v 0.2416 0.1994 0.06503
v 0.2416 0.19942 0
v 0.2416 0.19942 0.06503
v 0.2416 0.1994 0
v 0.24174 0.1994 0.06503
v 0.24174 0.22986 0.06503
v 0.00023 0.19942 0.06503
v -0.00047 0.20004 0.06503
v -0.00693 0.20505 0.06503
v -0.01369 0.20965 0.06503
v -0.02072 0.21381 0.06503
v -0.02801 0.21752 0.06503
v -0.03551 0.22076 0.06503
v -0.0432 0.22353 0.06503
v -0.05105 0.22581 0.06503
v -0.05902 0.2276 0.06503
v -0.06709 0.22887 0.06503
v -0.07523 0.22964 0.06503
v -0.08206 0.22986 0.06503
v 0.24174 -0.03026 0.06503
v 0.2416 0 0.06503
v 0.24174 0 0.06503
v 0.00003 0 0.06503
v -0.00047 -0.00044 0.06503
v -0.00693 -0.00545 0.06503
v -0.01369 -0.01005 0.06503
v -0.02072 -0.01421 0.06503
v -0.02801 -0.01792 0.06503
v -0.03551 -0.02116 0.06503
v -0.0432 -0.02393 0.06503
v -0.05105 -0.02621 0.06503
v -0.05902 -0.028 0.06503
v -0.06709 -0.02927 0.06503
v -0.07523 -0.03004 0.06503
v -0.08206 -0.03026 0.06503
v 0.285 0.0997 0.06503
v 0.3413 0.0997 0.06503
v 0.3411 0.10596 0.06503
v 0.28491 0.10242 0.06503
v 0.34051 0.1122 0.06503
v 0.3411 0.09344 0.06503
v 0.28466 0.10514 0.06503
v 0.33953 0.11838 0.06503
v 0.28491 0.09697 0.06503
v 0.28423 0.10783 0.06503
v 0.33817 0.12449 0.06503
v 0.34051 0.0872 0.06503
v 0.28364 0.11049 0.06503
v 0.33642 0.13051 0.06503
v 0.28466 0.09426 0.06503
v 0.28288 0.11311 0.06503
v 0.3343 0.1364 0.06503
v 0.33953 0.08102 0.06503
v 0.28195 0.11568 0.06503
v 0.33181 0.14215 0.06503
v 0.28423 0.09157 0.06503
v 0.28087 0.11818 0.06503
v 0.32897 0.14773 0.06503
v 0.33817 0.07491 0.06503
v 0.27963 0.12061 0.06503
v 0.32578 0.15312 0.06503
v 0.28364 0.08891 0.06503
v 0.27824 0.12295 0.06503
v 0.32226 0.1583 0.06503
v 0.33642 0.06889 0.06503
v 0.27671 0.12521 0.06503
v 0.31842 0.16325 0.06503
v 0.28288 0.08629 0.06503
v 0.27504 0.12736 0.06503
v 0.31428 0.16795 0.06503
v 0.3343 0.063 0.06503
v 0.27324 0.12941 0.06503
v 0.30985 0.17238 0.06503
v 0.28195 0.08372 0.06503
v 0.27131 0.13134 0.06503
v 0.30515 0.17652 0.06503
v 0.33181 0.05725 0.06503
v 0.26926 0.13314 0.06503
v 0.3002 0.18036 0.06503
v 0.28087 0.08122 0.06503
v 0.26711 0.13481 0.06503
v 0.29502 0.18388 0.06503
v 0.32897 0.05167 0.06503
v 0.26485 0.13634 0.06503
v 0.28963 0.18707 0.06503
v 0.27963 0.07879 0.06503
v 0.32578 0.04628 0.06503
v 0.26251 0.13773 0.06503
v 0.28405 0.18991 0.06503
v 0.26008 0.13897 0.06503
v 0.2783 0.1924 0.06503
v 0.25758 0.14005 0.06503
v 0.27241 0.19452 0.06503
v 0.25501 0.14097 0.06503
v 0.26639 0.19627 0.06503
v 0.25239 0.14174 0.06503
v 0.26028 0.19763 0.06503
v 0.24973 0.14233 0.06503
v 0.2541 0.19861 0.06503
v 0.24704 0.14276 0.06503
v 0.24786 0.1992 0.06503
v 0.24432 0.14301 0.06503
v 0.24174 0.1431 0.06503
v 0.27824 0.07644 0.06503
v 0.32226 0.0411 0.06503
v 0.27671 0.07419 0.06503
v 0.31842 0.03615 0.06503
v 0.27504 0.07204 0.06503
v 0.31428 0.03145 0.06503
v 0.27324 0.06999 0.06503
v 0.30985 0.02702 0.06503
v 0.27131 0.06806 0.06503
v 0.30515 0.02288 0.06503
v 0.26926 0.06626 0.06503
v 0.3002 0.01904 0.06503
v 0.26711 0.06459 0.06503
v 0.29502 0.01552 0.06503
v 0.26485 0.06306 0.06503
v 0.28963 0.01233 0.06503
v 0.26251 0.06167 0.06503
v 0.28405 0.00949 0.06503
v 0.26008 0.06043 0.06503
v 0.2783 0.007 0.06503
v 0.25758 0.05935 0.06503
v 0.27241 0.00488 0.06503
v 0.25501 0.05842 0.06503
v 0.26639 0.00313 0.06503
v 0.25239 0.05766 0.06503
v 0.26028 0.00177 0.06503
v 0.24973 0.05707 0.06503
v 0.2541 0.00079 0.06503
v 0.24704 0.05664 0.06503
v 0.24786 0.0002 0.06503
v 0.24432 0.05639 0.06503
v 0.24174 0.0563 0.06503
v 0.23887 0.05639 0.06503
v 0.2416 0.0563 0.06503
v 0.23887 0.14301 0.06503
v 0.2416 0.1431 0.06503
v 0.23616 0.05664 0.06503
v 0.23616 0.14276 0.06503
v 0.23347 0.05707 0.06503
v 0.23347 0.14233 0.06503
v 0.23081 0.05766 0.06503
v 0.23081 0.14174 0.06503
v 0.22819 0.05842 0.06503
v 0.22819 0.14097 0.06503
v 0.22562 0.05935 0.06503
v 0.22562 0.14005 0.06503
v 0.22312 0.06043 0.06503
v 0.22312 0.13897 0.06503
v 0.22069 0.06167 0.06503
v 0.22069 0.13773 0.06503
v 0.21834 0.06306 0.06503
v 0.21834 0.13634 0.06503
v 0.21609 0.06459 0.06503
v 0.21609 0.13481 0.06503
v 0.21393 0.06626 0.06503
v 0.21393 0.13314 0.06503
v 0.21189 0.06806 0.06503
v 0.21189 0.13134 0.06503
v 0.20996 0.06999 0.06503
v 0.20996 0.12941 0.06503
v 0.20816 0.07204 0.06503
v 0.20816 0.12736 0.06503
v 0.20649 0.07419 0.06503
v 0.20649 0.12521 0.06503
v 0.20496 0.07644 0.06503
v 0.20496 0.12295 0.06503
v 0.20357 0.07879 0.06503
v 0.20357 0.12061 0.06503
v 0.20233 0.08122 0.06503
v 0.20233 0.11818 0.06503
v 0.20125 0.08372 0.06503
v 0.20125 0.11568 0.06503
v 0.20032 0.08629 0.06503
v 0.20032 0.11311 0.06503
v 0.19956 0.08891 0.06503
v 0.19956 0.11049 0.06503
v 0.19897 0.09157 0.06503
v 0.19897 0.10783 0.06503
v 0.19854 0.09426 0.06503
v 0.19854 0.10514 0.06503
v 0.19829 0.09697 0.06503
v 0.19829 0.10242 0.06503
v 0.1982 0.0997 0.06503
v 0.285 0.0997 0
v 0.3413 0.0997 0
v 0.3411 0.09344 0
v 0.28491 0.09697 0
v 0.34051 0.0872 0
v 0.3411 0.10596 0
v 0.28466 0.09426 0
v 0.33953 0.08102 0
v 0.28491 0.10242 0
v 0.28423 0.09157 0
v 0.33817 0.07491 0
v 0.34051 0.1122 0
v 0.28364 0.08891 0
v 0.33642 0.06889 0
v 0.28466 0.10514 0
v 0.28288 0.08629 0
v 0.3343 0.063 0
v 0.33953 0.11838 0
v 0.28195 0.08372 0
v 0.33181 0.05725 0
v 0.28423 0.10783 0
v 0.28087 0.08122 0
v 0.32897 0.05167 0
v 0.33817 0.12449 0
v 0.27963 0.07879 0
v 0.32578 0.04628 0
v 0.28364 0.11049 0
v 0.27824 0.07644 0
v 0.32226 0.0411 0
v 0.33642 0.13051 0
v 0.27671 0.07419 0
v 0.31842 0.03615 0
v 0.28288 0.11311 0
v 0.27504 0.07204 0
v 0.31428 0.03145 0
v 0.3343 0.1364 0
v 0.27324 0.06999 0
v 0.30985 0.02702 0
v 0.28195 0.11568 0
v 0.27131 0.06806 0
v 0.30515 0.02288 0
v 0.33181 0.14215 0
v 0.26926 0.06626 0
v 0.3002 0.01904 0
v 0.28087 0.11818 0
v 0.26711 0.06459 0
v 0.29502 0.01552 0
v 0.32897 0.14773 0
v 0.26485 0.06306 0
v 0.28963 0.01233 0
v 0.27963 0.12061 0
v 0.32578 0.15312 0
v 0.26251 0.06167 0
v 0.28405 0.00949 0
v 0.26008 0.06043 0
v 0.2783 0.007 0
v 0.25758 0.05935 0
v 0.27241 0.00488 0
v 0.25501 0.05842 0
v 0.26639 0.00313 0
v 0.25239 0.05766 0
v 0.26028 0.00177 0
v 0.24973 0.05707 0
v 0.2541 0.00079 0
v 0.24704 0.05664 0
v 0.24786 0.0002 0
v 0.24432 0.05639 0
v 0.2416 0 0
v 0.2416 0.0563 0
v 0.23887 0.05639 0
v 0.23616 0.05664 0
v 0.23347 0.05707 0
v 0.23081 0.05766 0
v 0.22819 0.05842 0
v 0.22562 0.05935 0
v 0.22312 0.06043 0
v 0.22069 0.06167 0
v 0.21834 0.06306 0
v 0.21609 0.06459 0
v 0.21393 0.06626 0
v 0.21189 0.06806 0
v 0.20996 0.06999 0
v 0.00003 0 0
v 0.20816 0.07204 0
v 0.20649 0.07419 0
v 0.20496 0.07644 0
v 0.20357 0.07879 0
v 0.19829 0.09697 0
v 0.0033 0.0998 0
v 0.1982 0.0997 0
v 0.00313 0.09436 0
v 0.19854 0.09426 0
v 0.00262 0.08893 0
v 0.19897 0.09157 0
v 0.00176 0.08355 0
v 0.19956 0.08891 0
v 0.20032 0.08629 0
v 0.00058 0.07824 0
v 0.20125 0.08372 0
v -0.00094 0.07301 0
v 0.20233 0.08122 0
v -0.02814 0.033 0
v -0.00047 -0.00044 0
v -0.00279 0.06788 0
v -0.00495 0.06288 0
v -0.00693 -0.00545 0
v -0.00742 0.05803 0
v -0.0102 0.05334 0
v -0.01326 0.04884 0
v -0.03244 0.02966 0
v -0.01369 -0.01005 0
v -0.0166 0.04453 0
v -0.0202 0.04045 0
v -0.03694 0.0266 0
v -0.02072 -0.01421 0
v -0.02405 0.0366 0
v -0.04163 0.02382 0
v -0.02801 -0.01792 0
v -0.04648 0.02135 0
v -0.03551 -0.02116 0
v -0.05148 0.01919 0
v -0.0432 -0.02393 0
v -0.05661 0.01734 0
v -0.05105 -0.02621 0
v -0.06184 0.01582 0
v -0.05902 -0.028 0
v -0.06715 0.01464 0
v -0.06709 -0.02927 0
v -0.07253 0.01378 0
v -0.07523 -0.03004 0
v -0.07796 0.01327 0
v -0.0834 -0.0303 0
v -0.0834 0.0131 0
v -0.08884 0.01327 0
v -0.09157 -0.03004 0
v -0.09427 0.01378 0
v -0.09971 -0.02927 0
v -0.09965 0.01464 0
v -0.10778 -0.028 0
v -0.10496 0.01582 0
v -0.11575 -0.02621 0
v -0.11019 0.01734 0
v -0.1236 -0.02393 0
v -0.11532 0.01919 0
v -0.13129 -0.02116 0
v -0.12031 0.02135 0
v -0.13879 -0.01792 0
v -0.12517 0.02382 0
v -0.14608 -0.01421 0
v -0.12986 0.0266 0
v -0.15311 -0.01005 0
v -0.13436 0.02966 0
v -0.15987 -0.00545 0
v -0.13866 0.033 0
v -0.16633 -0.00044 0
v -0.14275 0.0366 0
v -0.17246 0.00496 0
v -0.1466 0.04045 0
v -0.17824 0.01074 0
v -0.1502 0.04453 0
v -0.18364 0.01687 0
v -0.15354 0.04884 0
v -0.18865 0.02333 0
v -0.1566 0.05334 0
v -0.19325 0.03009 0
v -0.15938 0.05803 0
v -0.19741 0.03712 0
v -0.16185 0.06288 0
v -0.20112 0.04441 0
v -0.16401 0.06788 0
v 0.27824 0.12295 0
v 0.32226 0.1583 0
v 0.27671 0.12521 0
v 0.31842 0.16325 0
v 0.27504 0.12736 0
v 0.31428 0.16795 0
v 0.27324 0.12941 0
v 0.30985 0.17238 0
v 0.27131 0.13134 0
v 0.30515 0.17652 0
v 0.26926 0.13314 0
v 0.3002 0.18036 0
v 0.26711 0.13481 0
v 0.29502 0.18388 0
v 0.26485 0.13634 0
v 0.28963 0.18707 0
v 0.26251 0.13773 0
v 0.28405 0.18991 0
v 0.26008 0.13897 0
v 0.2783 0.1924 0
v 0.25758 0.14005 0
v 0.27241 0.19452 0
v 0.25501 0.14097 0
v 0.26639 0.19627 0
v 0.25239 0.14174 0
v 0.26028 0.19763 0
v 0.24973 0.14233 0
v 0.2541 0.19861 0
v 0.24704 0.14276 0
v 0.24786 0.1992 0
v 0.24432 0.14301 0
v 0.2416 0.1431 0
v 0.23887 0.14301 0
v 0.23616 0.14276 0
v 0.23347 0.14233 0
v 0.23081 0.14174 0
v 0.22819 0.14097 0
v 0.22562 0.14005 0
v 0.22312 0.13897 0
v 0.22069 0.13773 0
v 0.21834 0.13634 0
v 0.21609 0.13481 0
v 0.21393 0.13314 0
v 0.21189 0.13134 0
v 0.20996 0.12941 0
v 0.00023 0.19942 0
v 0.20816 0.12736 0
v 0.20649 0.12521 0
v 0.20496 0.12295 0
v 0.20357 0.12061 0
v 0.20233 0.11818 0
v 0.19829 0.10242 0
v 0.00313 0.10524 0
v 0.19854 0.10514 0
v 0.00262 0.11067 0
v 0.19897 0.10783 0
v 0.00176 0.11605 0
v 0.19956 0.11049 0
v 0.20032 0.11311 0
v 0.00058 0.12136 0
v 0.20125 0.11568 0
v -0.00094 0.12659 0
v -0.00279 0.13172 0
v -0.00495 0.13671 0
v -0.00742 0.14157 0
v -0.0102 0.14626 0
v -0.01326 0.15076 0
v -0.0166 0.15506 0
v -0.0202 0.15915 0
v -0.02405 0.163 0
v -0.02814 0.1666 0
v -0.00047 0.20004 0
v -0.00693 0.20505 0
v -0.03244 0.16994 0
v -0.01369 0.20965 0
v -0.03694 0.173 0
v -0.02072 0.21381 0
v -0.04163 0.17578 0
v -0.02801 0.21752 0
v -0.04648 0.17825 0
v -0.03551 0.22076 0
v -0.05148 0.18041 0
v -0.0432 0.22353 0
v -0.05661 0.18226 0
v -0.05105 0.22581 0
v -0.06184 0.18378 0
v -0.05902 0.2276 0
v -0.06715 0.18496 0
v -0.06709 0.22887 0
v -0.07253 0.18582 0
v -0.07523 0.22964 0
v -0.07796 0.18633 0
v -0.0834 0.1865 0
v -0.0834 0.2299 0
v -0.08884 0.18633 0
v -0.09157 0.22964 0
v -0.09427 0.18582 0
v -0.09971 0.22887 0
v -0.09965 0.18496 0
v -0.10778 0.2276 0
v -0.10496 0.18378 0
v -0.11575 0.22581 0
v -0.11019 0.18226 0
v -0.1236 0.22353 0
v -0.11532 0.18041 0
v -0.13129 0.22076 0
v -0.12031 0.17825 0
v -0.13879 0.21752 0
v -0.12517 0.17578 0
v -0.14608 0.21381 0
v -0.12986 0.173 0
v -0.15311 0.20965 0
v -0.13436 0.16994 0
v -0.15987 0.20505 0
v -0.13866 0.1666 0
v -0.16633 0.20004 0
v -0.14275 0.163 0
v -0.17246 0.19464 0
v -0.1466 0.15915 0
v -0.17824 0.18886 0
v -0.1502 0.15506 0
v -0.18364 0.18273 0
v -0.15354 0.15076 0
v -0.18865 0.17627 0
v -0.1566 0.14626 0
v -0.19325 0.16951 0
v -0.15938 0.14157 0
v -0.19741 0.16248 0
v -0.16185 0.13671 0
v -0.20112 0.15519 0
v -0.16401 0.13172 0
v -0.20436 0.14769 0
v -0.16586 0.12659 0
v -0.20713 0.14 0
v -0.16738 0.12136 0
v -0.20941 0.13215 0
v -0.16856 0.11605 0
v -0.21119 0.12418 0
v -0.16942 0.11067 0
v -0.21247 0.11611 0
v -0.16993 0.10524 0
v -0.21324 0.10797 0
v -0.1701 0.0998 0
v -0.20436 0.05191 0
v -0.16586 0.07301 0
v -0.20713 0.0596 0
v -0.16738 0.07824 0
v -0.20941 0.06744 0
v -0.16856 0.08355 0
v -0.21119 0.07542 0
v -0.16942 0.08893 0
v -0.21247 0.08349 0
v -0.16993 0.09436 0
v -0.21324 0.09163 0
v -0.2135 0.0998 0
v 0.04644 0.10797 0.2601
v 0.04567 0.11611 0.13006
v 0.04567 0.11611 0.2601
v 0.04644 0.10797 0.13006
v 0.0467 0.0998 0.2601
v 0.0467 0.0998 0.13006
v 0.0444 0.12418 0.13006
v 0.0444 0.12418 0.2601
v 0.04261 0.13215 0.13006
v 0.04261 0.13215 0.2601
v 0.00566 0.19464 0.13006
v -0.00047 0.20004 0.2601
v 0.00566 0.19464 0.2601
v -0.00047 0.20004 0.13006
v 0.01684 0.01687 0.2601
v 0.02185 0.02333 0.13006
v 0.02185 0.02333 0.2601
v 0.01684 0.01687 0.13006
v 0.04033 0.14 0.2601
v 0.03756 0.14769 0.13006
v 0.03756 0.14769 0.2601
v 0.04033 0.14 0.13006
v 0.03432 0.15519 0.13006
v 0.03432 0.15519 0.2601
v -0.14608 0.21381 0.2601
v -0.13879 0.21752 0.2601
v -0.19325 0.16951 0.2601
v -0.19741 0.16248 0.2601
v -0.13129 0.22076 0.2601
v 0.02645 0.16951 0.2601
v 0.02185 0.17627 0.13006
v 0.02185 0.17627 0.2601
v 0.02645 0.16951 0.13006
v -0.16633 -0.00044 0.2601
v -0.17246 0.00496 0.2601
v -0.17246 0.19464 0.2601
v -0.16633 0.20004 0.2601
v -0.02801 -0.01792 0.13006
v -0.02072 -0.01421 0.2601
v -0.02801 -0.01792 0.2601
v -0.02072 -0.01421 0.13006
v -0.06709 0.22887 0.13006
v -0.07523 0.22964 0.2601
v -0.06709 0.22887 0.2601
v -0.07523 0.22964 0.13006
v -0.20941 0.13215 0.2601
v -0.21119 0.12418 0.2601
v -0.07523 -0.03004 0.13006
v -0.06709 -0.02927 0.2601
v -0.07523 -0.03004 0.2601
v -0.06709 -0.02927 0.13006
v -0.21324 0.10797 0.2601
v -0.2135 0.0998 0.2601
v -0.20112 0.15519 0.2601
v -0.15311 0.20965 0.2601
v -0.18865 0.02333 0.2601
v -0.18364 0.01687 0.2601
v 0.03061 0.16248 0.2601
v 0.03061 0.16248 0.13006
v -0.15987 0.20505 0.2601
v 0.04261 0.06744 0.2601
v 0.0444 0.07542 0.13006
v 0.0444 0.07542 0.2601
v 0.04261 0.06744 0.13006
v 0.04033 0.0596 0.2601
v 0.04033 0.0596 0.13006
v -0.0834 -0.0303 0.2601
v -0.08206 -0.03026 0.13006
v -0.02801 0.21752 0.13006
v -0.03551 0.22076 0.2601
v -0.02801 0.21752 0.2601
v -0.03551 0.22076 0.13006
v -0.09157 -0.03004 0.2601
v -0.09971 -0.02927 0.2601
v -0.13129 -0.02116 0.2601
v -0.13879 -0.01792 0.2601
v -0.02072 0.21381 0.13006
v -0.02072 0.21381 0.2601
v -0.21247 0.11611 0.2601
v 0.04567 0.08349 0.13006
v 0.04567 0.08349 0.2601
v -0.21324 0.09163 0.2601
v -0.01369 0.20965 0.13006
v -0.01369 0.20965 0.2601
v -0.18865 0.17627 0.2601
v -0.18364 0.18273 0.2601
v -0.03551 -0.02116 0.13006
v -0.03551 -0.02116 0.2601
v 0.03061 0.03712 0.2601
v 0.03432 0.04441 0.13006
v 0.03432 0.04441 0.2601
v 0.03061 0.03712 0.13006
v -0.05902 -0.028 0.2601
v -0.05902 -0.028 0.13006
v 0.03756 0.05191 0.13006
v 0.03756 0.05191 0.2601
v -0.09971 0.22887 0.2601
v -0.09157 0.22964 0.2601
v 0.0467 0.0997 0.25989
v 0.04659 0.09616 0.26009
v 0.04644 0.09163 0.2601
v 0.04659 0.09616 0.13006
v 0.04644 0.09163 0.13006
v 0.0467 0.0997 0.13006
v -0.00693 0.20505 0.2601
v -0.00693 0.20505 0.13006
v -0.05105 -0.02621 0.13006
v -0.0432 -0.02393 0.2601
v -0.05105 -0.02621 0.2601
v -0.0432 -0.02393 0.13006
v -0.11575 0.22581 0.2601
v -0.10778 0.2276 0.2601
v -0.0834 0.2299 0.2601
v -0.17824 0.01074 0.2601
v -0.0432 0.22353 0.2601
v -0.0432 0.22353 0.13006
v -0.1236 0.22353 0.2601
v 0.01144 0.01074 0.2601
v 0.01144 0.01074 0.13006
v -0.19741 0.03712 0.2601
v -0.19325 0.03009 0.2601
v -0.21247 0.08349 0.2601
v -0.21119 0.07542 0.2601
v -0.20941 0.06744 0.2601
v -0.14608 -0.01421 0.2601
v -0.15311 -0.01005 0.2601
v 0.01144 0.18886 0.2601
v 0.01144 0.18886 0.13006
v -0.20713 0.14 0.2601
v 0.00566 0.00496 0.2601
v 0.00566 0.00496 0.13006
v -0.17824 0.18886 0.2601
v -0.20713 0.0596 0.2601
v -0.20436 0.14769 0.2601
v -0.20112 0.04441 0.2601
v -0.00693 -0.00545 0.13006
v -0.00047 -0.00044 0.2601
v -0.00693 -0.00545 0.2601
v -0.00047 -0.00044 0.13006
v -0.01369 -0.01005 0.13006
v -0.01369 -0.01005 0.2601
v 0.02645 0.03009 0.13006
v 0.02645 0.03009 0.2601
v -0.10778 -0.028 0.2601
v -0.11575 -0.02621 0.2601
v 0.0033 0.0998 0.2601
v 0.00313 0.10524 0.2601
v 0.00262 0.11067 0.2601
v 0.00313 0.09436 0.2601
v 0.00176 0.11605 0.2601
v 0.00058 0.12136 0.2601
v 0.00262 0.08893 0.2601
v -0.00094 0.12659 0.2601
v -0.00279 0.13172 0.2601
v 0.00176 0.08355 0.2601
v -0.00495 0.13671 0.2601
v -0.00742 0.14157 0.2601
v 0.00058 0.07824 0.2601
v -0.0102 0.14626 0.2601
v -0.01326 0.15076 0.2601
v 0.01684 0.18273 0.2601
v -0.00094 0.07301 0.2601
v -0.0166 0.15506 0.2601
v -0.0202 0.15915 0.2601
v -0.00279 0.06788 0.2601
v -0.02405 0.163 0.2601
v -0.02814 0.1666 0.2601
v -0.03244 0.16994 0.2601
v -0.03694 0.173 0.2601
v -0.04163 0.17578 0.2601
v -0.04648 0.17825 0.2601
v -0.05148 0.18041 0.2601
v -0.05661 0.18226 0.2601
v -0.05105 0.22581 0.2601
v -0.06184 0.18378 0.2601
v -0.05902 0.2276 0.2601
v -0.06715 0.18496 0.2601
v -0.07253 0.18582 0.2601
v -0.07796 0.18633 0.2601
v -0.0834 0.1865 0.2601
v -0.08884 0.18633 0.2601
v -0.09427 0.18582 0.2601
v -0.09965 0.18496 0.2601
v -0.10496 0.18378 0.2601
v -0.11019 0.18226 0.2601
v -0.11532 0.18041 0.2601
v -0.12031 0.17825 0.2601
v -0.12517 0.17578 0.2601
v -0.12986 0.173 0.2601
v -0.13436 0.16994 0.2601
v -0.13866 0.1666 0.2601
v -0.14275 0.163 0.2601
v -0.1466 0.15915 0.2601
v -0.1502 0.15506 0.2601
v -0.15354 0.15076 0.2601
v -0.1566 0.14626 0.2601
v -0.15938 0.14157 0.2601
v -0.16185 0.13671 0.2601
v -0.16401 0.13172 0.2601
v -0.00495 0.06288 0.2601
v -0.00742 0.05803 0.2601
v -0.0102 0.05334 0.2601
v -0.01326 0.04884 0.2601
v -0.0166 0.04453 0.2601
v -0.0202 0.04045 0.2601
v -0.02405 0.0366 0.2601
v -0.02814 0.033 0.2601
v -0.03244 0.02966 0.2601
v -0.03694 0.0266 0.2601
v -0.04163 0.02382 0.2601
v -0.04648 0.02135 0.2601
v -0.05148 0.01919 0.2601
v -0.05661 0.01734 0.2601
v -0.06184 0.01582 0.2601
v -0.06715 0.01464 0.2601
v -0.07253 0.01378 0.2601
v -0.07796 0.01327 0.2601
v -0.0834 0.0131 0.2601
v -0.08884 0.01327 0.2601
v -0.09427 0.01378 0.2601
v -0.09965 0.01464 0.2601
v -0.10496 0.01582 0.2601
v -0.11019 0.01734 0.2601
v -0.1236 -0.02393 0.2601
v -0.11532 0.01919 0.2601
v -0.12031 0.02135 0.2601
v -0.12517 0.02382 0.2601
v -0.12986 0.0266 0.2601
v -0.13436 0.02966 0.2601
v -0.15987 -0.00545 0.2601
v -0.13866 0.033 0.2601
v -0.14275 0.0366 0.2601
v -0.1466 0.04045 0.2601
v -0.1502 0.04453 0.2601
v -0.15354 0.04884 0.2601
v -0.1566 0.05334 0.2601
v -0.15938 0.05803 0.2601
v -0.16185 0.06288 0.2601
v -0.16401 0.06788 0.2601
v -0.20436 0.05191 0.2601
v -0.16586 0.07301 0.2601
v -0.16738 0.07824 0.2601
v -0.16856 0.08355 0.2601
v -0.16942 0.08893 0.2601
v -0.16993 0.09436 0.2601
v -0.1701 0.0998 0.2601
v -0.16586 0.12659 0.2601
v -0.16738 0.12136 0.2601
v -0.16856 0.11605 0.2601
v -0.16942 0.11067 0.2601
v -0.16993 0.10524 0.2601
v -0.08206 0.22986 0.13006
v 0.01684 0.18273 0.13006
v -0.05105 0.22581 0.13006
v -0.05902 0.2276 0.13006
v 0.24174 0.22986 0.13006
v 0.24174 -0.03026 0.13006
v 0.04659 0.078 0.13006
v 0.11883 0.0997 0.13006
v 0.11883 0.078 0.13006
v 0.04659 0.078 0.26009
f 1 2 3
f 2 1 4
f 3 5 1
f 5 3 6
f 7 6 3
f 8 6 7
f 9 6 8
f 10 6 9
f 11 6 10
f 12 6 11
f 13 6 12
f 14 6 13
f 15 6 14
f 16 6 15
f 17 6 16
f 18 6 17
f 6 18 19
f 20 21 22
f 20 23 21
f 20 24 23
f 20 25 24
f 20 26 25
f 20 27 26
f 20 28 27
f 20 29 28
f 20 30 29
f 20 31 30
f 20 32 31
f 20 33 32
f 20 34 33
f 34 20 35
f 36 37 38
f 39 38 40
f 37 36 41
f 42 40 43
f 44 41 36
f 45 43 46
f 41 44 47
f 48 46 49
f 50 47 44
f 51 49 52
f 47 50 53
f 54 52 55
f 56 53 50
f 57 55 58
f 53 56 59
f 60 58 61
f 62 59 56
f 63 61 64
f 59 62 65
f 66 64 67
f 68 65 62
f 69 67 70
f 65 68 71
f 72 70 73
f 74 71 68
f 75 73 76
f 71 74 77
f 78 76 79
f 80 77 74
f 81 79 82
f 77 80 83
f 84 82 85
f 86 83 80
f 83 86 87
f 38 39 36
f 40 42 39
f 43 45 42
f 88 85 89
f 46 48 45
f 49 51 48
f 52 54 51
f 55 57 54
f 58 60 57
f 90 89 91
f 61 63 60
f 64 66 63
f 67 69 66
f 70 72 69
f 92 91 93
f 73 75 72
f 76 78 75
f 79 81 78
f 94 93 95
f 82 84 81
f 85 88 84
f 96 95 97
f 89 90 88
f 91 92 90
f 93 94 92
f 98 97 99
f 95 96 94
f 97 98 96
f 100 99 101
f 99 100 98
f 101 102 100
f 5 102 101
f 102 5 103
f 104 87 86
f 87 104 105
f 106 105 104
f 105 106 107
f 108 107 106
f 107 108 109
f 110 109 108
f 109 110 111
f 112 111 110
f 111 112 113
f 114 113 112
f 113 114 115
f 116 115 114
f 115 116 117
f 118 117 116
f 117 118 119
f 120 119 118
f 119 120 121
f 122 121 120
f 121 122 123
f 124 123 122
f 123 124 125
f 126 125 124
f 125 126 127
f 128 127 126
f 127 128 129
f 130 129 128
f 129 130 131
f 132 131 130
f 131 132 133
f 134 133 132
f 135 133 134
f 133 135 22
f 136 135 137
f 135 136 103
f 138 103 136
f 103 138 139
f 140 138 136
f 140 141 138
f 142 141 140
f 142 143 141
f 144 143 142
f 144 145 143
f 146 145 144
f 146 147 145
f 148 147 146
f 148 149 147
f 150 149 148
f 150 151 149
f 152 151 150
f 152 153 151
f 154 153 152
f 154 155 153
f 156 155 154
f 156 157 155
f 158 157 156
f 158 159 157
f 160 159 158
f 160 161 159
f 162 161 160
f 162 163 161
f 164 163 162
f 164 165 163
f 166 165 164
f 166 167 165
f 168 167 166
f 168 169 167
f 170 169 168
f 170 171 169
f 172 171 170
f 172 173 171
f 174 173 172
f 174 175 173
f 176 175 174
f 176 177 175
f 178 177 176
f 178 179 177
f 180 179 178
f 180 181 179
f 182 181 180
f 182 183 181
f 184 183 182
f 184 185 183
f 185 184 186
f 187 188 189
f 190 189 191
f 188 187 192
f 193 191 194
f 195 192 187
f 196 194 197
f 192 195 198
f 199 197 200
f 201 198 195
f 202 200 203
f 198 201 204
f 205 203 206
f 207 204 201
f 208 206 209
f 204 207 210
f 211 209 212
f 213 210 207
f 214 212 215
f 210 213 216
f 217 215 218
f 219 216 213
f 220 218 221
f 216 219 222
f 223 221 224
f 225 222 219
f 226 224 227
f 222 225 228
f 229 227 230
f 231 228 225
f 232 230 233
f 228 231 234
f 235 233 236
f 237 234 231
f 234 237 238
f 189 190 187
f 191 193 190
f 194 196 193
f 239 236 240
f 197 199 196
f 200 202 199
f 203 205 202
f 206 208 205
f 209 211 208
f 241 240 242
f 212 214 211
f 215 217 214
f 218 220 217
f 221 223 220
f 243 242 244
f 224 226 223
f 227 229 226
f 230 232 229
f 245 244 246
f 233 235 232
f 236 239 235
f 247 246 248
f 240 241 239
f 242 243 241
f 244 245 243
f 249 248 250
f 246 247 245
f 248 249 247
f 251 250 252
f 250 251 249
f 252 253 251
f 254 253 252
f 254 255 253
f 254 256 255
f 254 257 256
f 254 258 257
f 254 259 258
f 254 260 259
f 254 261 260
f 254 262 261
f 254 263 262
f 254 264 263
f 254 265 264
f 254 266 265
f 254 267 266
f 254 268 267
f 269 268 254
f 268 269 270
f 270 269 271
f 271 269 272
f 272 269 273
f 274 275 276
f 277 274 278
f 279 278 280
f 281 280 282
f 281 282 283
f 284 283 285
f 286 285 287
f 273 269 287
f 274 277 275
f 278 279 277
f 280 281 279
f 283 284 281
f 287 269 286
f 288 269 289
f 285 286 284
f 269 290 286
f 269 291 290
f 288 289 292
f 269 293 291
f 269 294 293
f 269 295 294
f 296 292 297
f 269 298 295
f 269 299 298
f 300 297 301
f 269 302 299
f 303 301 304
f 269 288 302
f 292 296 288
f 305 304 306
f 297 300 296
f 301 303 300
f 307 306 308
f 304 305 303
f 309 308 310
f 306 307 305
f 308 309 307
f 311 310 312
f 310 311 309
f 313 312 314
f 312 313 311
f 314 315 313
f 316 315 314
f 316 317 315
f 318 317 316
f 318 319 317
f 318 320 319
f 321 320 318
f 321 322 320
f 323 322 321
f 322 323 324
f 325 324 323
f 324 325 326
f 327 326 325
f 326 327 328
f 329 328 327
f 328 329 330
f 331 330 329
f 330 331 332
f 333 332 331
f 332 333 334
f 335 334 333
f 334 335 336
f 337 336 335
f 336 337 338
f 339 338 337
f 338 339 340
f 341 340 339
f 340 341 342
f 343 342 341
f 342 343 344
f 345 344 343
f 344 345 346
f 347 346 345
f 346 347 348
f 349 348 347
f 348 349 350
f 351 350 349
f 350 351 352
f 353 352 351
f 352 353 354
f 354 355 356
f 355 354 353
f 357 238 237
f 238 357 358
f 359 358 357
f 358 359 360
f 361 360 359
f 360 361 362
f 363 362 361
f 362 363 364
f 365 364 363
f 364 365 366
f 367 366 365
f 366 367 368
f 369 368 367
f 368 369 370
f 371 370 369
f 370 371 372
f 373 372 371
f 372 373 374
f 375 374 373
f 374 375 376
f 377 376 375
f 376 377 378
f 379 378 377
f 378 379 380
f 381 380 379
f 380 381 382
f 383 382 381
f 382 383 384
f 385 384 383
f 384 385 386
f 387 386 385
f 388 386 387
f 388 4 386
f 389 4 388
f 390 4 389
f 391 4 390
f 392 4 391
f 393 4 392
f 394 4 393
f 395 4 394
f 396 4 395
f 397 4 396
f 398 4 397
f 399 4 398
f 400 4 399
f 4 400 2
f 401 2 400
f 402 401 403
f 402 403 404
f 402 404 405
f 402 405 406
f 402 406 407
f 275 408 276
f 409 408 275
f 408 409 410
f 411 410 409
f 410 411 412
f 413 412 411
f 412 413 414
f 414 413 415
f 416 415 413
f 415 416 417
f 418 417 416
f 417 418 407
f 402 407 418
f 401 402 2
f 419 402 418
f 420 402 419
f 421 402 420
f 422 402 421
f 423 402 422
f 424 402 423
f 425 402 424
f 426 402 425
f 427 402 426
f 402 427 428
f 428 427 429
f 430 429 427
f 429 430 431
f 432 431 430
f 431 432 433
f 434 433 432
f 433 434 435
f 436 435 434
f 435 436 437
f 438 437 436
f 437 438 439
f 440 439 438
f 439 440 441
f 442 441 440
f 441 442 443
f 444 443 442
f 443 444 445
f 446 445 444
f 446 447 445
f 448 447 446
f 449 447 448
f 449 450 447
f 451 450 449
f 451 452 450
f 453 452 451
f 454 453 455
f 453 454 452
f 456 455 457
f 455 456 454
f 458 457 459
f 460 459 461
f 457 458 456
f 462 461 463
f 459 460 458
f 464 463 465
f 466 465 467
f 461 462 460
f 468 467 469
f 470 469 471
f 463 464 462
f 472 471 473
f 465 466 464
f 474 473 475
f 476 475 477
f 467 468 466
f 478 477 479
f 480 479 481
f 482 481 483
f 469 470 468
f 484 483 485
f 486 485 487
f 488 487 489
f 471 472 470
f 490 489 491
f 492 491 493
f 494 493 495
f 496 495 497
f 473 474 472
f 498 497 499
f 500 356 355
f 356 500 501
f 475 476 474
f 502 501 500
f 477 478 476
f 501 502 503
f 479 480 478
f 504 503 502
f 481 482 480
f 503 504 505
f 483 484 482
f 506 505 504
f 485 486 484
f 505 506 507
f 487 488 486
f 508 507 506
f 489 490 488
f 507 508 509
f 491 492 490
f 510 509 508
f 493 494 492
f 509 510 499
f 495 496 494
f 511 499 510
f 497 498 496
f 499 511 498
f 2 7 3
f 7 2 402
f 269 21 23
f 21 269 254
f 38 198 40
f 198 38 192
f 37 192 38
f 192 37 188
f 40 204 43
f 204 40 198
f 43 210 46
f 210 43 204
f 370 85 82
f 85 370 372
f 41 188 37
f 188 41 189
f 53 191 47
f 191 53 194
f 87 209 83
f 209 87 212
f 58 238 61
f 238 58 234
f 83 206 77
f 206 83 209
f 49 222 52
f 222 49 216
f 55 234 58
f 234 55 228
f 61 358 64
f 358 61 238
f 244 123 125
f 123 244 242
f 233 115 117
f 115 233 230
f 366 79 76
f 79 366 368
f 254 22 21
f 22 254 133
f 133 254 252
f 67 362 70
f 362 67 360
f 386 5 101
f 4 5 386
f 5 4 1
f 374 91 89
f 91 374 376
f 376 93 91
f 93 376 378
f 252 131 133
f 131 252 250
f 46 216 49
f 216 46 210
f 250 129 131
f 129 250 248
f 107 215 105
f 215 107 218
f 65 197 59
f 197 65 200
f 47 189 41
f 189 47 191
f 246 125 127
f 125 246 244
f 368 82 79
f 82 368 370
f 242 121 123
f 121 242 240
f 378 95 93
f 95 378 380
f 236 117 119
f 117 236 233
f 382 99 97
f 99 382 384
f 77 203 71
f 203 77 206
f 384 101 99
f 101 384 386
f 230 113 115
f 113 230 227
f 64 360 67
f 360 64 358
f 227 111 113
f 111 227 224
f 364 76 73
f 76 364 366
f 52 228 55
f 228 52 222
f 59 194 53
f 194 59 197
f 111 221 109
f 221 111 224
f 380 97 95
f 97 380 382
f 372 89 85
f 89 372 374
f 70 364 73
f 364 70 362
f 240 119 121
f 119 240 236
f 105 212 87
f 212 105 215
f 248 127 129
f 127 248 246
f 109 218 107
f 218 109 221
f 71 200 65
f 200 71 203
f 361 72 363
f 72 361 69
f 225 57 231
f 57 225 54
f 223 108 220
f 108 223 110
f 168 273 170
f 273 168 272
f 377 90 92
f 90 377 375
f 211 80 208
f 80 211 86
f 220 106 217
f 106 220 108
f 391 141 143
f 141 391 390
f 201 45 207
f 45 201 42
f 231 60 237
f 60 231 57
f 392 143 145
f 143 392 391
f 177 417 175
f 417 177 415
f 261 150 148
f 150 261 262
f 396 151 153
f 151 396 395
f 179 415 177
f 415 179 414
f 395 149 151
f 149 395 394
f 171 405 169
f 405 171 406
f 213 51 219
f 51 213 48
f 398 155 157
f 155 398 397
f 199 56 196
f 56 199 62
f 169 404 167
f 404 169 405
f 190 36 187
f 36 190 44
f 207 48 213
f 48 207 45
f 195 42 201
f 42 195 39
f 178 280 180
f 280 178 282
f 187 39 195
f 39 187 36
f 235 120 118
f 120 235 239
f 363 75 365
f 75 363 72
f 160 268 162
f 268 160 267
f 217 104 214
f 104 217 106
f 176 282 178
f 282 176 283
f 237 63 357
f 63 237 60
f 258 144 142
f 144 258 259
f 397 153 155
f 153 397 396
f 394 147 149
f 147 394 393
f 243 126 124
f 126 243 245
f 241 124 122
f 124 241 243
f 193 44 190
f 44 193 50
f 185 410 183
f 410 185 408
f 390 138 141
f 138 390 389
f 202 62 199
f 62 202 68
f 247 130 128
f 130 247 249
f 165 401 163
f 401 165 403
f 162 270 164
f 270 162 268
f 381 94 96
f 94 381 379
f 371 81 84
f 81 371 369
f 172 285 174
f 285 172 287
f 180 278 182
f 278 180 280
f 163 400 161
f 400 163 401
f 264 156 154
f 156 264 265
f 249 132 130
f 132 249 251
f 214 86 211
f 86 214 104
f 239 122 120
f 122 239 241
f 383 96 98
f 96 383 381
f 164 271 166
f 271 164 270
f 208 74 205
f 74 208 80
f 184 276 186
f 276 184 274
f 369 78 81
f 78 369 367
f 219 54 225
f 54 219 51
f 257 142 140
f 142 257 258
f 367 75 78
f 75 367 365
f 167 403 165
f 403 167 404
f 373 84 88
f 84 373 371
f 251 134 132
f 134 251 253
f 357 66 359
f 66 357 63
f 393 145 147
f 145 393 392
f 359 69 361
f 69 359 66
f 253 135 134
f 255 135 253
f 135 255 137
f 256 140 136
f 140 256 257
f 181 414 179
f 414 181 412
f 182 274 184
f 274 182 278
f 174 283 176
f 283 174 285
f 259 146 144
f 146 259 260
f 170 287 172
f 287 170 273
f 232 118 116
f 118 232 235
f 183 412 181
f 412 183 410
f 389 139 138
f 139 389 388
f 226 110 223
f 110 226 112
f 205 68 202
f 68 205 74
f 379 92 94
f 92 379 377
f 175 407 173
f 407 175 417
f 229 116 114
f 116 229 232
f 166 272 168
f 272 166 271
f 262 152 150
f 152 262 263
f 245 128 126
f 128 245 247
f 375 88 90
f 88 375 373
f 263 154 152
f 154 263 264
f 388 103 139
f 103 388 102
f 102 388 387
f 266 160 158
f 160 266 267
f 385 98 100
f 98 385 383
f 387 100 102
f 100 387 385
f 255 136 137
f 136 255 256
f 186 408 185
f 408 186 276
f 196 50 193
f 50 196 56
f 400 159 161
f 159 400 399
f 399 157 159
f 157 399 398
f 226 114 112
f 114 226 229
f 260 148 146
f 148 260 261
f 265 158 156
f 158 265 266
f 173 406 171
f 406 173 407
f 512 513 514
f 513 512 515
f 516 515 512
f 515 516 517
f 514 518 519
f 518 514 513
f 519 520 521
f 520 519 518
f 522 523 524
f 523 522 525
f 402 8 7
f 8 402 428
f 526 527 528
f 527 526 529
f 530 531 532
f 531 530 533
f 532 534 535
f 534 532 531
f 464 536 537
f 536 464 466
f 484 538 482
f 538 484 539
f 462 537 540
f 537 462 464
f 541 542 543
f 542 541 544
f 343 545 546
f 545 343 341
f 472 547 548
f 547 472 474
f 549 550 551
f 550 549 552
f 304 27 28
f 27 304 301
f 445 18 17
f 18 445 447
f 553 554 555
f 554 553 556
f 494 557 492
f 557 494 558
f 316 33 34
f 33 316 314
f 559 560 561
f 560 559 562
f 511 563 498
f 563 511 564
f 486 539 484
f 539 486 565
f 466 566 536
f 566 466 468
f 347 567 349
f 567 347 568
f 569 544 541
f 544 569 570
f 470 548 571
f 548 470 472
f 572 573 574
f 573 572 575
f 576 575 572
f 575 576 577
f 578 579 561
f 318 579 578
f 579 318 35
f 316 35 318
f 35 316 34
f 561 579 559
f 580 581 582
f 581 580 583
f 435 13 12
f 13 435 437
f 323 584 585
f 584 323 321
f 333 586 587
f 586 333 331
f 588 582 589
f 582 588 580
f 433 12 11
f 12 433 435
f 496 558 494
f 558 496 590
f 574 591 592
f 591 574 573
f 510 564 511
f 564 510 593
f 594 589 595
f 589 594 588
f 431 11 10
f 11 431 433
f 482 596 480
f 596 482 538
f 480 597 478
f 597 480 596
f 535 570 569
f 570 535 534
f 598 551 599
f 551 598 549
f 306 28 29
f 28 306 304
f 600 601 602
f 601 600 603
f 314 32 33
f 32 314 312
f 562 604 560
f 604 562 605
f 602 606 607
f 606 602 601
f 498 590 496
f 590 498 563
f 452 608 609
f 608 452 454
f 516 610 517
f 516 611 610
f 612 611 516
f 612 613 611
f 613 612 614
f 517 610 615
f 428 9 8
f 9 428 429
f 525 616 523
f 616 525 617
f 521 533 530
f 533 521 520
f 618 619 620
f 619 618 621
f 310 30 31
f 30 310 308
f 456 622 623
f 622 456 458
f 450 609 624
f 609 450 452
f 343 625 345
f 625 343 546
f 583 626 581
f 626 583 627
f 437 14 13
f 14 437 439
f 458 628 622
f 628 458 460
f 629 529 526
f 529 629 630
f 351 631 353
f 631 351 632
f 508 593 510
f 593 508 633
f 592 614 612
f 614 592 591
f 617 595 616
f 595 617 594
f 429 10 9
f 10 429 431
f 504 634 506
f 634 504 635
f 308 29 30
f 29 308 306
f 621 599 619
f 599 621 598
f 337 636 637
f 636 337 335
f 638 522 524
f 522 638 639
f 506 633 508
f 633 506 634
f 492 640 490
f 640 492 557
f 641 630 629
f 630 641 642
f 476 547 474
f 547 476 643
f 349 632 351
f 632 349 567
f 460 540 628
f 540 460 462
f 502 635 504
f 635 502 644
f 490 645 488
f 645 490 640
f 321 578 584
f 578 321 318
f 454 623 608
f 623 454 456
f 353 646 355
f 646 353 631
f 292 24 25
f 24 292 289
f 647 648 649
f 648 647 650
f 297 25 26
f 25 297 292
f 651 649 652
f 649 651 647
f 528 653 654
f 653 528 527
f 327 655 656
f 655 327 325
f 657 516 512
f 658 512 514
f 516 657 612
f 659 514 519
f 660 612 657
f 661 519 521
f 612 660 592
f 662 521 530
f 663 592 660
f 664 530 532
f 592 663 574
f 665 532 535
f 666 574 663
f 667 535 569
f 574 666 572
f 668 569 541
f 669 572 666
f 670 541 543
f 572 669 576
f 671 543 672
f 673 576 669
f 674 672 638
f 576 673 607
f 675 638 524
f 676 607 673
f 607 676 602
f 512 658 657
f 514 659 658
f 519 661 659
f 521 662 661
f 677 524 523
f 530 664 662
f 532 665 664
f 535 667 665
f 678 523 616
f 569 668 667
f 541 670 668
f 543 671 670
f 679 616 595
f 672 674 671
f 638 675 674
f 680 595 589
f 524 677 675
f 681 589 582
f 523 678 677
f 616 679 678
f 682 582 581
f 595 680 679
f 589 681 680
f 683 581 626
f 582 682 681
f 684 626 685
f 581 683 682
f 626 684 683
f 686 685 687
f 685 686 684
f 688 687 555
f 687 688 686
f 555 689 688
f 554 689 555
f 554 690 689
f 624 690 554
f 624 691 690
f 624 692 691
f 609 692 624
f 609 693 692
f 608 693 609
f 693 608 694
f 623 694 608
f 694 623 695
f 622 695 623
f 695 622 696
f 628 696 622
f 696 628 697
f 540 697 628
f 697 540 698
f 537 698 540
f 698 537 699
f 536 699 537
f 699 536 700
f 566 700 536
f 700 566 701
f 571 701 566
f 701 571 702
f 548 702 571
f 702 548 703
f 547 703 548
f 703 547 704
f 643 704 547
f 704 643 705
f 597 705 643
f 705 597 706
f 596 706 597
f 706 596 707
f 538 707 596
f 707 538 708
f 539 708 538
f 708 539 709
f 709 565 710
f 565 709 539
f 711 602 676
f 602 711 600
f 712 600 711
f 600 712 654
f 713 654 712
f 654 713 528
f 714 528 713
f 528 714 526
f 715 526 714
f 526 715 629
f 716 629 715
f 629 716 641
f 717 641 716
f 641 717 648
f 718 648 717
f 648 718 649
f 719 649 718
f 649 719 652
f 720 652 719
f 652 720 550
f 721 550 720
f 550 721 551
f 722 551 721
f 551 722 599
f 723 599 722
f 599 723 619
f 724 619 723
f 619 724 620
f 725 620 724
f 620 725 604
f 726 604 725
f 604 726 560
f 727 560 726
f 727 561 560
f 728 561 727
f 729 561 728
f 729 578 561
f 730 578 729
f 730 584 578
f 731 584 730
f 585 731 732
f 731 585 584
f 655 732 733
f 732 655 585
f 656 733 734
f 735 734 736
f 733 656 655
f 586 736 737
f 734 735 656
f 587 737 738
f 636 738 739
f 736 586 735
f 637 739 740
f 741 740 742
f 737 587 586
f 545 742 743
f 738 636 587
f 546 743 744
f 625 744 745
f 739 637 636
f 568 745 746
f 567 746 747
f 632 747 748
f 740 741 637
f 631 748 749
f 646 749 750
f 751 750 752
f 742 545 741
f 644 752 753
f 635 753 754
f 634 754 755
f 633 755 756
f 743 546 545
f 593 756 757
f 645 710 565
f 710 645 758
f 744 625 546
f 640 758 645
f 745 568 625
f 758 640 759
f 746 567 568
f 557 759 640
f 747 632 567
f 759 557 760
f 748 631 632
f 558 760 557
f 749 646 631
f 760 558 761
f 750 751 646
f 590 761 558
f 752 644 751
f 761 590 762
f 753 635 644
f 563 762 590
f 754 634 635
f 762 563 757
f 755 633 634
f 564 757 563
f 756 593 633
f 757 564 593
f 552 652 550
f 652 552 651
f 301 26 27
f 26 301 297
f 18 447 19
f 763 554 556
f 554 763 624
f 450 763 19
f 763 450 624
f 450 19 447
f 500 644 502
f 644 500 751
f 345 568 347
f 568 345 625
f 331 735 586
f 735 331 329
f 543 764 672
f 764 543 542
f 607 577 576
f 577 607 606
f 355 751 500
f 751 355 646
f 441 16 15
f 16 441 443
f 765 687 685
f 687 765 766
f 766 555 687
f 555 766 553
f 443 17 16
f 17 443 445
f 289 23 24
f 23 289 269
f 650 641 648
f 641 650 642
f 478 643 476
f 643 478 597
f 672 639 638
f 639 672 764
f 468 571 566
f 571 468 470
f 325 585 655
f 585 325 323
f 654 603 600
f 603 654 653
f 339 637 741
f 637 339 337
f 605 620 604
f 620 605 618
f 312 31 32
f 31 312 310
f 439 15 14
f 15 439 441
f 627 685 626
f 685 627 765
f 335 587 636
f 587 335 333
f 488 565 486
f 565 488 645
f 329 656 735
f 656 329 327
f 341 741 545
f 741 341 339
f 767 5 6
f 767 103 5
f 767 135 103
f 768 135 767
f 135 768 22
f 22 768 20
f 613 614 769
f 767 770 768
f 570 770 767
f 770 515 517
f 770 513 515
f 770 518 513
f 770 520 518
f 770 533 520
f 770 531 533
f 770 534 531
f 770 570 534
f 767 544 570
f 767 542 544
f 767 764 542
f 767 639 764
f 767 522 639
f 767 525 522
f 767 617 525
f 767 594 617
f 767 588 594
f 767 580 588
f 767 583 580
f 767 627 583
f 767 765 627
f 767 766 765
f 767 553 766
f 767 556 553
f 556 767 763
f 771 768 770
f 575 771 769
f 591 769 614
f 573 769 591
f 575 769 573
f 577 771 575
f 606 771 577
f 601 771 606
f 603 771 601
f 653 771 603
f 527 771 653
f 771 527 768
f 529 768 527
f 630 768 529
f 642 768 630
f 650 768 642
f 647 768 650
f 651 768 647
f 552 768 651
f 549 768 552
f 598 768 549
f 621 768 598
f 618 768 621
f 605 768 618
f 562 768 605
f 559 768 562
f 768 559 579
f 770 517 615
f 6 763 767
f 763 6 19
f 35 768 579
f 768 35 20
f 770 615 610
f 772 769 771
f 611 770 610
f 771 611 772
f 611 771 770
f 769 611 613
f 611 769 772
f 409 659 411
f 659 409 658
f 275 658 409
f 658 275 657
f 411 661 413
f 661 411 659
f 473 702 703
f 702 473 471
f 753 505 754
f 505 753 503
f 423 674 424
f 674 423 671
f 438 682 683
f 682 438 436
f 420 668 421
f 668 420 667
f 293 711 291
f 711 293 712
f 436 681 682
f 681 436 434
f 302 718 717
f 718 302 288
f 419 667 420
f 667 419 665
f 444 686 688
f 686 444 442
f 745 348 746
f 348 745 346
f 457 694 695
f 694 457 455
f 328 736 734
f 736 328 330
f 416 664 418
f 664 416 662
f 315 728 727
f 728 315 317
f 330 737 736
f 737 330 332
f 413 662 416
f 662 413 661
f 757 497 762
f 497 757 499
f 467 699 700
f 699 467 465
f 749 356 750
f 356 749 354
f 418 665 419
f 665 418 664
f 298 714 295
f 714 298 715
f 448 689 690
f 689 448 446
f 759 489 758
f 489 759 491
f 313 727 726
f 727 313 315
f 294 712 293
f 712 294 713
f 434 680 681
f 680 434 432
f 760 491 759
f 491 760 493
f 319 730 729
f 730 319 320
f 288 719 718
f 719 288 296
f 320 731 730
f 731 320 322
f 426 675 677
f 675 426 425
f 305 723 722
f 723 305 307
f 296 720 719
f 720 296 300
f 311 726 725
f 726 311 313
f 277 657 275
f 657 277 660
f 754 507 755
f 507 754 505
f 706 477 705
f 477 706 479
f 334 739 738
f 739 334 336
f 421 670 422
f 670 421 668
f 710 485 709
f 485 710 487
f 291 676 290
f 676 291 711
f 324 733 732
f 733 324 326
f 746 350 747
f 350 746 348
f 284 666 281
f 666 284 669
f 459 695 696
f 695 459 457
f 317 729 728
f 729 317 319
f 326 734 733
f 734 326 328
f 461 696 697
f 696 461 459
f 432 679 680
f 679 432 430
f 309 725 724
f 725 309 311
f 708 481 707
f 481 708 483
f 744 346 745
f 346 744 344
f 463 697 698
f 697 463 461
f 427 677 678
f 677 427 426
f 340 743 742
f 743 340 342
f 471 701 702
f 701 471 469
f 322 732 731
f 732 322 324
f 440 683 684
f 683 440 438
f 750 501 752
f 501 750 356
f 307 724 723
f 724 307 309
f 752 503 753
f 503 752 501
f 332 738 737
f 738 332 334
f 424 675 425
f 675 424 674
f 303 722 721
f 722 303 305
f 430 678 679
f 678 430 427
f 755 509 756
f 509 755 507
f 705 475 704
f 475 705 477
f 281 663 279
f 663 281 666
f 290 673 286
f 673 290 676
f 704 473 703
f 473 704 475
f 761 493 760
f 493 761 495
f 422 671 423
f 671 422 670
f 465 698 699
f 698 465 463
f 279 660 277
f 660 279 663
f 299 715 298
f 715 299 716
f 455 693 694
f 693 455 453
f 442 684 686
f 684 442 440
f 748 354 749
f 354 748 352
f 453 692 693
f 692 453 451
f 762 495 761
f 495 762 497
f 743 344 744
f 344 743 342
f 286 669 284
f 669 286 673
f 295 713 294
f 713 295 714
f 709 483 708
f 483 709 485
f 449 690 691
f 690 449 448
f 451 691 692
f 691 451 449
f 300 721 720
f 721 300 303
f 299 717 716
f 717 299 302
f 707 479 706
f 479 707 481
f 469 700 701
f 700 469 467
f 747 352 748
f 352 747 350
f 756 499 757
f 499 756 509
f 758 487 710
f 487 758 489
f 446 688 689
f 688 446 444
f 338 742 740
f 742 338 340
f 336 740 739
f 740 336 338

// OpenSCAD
// --- Parametric Variables ---

// Global resolution for smooth curves
$fn = 100;

// Base dimensions
base_length = 0.341352;
base_width = 0.199422;
base_height = 0.065029;

// Base rounded annular section (right side)
ring_x = 0.2416;
ring_y = 0.0997;
ring_r_out = 0.0997;
ring_r_in = 0.0434;

// Tall hollow sleeve (left side)
sleeve_x = -0.0834;
sleeve_y = 0.0998;
sleeve_r_out = 0.1301;
sleeve_r_in = 0.0867;
sleeve_height = 0.2601;

// Projecting arm section
arm_length = 0.325145;
arm_width = 0.260116;
arm_z_offset = 0.065029; // Floating above the 0 to 0.065 gap
arm_height = 0.130058 - arm_z_offset; 

// Triangular web
web_run = 0.108382;
web_thickness = 0.0217;
web_x_start = 0.0466;
web_y_center = (0.0781 + 0.0996) / 2; // Centered between front/back offsets
web_z_start = 0.065029;
web_z_end = 0.2601;

// --- Modules ---

// Main base with the rounded right end and through-hole
module base_solid() {
    difference() {
        union() {
            // Main rectangular body
            translate([0, 0, 0])
                cube([ring_x, base_width, base_height]);
            
            // Rounded annular section at the right end
            translate([ring_x, ring_y, 0])
                cylinder(h=base_height, r=ring_r_out);
        }
        // Inner profile kept open through the 0.065 thickness
        translate([ring_x, ring_y, -0.1])
            cylinder(h=base_height + 0.2, r=ring_r_in);
    }
}

// Solid cylinder for the tall sleeve (hole cut later to clear arm intersection)
module tall_sleeve() {
    translate([sleeve_x, sleeve_y, 0])
        cylinder(h=sleeve_height, r=sleeve_r_out);
}

// Raised stepped tier arm spanning between the sleeve and the base
module projecting_arm() {
    translate([sleeve_x, sleeve_y - arm_width/2, arm_z_offset])
        cube([arm_length, arm_width, arm_height]);
}

// Narrow triangular web connecting the arm to the tall sleeve
module triangular_web() {
    translate([0, web_y_center, 0])
        rotate([90, 0, 0])
        linear_extrude(height=web_thickness, center=true)
        polygon([
            [web_x_start, web_z_start],
            [web_x_start + web_run, web_z_start],
            [web_x_start, web_z_end]
        ]);
}

// --- Main Assembly ---

difference() {
    // Combine all solid bodies
    union() {
        base_solid();
        tall_sleeve();
        projecting_arm();
        triangular_web();
    }
    
    // Ensure the tall sleeve remains hollow through its entire height,
    // cutting through any overlapping geometry from the arm or web.
    translate([sleeve_x, sleeve_y, -0.1])
        cylinder(h=sleeve_height + 0.2, r=sleeve_r_in);
}
